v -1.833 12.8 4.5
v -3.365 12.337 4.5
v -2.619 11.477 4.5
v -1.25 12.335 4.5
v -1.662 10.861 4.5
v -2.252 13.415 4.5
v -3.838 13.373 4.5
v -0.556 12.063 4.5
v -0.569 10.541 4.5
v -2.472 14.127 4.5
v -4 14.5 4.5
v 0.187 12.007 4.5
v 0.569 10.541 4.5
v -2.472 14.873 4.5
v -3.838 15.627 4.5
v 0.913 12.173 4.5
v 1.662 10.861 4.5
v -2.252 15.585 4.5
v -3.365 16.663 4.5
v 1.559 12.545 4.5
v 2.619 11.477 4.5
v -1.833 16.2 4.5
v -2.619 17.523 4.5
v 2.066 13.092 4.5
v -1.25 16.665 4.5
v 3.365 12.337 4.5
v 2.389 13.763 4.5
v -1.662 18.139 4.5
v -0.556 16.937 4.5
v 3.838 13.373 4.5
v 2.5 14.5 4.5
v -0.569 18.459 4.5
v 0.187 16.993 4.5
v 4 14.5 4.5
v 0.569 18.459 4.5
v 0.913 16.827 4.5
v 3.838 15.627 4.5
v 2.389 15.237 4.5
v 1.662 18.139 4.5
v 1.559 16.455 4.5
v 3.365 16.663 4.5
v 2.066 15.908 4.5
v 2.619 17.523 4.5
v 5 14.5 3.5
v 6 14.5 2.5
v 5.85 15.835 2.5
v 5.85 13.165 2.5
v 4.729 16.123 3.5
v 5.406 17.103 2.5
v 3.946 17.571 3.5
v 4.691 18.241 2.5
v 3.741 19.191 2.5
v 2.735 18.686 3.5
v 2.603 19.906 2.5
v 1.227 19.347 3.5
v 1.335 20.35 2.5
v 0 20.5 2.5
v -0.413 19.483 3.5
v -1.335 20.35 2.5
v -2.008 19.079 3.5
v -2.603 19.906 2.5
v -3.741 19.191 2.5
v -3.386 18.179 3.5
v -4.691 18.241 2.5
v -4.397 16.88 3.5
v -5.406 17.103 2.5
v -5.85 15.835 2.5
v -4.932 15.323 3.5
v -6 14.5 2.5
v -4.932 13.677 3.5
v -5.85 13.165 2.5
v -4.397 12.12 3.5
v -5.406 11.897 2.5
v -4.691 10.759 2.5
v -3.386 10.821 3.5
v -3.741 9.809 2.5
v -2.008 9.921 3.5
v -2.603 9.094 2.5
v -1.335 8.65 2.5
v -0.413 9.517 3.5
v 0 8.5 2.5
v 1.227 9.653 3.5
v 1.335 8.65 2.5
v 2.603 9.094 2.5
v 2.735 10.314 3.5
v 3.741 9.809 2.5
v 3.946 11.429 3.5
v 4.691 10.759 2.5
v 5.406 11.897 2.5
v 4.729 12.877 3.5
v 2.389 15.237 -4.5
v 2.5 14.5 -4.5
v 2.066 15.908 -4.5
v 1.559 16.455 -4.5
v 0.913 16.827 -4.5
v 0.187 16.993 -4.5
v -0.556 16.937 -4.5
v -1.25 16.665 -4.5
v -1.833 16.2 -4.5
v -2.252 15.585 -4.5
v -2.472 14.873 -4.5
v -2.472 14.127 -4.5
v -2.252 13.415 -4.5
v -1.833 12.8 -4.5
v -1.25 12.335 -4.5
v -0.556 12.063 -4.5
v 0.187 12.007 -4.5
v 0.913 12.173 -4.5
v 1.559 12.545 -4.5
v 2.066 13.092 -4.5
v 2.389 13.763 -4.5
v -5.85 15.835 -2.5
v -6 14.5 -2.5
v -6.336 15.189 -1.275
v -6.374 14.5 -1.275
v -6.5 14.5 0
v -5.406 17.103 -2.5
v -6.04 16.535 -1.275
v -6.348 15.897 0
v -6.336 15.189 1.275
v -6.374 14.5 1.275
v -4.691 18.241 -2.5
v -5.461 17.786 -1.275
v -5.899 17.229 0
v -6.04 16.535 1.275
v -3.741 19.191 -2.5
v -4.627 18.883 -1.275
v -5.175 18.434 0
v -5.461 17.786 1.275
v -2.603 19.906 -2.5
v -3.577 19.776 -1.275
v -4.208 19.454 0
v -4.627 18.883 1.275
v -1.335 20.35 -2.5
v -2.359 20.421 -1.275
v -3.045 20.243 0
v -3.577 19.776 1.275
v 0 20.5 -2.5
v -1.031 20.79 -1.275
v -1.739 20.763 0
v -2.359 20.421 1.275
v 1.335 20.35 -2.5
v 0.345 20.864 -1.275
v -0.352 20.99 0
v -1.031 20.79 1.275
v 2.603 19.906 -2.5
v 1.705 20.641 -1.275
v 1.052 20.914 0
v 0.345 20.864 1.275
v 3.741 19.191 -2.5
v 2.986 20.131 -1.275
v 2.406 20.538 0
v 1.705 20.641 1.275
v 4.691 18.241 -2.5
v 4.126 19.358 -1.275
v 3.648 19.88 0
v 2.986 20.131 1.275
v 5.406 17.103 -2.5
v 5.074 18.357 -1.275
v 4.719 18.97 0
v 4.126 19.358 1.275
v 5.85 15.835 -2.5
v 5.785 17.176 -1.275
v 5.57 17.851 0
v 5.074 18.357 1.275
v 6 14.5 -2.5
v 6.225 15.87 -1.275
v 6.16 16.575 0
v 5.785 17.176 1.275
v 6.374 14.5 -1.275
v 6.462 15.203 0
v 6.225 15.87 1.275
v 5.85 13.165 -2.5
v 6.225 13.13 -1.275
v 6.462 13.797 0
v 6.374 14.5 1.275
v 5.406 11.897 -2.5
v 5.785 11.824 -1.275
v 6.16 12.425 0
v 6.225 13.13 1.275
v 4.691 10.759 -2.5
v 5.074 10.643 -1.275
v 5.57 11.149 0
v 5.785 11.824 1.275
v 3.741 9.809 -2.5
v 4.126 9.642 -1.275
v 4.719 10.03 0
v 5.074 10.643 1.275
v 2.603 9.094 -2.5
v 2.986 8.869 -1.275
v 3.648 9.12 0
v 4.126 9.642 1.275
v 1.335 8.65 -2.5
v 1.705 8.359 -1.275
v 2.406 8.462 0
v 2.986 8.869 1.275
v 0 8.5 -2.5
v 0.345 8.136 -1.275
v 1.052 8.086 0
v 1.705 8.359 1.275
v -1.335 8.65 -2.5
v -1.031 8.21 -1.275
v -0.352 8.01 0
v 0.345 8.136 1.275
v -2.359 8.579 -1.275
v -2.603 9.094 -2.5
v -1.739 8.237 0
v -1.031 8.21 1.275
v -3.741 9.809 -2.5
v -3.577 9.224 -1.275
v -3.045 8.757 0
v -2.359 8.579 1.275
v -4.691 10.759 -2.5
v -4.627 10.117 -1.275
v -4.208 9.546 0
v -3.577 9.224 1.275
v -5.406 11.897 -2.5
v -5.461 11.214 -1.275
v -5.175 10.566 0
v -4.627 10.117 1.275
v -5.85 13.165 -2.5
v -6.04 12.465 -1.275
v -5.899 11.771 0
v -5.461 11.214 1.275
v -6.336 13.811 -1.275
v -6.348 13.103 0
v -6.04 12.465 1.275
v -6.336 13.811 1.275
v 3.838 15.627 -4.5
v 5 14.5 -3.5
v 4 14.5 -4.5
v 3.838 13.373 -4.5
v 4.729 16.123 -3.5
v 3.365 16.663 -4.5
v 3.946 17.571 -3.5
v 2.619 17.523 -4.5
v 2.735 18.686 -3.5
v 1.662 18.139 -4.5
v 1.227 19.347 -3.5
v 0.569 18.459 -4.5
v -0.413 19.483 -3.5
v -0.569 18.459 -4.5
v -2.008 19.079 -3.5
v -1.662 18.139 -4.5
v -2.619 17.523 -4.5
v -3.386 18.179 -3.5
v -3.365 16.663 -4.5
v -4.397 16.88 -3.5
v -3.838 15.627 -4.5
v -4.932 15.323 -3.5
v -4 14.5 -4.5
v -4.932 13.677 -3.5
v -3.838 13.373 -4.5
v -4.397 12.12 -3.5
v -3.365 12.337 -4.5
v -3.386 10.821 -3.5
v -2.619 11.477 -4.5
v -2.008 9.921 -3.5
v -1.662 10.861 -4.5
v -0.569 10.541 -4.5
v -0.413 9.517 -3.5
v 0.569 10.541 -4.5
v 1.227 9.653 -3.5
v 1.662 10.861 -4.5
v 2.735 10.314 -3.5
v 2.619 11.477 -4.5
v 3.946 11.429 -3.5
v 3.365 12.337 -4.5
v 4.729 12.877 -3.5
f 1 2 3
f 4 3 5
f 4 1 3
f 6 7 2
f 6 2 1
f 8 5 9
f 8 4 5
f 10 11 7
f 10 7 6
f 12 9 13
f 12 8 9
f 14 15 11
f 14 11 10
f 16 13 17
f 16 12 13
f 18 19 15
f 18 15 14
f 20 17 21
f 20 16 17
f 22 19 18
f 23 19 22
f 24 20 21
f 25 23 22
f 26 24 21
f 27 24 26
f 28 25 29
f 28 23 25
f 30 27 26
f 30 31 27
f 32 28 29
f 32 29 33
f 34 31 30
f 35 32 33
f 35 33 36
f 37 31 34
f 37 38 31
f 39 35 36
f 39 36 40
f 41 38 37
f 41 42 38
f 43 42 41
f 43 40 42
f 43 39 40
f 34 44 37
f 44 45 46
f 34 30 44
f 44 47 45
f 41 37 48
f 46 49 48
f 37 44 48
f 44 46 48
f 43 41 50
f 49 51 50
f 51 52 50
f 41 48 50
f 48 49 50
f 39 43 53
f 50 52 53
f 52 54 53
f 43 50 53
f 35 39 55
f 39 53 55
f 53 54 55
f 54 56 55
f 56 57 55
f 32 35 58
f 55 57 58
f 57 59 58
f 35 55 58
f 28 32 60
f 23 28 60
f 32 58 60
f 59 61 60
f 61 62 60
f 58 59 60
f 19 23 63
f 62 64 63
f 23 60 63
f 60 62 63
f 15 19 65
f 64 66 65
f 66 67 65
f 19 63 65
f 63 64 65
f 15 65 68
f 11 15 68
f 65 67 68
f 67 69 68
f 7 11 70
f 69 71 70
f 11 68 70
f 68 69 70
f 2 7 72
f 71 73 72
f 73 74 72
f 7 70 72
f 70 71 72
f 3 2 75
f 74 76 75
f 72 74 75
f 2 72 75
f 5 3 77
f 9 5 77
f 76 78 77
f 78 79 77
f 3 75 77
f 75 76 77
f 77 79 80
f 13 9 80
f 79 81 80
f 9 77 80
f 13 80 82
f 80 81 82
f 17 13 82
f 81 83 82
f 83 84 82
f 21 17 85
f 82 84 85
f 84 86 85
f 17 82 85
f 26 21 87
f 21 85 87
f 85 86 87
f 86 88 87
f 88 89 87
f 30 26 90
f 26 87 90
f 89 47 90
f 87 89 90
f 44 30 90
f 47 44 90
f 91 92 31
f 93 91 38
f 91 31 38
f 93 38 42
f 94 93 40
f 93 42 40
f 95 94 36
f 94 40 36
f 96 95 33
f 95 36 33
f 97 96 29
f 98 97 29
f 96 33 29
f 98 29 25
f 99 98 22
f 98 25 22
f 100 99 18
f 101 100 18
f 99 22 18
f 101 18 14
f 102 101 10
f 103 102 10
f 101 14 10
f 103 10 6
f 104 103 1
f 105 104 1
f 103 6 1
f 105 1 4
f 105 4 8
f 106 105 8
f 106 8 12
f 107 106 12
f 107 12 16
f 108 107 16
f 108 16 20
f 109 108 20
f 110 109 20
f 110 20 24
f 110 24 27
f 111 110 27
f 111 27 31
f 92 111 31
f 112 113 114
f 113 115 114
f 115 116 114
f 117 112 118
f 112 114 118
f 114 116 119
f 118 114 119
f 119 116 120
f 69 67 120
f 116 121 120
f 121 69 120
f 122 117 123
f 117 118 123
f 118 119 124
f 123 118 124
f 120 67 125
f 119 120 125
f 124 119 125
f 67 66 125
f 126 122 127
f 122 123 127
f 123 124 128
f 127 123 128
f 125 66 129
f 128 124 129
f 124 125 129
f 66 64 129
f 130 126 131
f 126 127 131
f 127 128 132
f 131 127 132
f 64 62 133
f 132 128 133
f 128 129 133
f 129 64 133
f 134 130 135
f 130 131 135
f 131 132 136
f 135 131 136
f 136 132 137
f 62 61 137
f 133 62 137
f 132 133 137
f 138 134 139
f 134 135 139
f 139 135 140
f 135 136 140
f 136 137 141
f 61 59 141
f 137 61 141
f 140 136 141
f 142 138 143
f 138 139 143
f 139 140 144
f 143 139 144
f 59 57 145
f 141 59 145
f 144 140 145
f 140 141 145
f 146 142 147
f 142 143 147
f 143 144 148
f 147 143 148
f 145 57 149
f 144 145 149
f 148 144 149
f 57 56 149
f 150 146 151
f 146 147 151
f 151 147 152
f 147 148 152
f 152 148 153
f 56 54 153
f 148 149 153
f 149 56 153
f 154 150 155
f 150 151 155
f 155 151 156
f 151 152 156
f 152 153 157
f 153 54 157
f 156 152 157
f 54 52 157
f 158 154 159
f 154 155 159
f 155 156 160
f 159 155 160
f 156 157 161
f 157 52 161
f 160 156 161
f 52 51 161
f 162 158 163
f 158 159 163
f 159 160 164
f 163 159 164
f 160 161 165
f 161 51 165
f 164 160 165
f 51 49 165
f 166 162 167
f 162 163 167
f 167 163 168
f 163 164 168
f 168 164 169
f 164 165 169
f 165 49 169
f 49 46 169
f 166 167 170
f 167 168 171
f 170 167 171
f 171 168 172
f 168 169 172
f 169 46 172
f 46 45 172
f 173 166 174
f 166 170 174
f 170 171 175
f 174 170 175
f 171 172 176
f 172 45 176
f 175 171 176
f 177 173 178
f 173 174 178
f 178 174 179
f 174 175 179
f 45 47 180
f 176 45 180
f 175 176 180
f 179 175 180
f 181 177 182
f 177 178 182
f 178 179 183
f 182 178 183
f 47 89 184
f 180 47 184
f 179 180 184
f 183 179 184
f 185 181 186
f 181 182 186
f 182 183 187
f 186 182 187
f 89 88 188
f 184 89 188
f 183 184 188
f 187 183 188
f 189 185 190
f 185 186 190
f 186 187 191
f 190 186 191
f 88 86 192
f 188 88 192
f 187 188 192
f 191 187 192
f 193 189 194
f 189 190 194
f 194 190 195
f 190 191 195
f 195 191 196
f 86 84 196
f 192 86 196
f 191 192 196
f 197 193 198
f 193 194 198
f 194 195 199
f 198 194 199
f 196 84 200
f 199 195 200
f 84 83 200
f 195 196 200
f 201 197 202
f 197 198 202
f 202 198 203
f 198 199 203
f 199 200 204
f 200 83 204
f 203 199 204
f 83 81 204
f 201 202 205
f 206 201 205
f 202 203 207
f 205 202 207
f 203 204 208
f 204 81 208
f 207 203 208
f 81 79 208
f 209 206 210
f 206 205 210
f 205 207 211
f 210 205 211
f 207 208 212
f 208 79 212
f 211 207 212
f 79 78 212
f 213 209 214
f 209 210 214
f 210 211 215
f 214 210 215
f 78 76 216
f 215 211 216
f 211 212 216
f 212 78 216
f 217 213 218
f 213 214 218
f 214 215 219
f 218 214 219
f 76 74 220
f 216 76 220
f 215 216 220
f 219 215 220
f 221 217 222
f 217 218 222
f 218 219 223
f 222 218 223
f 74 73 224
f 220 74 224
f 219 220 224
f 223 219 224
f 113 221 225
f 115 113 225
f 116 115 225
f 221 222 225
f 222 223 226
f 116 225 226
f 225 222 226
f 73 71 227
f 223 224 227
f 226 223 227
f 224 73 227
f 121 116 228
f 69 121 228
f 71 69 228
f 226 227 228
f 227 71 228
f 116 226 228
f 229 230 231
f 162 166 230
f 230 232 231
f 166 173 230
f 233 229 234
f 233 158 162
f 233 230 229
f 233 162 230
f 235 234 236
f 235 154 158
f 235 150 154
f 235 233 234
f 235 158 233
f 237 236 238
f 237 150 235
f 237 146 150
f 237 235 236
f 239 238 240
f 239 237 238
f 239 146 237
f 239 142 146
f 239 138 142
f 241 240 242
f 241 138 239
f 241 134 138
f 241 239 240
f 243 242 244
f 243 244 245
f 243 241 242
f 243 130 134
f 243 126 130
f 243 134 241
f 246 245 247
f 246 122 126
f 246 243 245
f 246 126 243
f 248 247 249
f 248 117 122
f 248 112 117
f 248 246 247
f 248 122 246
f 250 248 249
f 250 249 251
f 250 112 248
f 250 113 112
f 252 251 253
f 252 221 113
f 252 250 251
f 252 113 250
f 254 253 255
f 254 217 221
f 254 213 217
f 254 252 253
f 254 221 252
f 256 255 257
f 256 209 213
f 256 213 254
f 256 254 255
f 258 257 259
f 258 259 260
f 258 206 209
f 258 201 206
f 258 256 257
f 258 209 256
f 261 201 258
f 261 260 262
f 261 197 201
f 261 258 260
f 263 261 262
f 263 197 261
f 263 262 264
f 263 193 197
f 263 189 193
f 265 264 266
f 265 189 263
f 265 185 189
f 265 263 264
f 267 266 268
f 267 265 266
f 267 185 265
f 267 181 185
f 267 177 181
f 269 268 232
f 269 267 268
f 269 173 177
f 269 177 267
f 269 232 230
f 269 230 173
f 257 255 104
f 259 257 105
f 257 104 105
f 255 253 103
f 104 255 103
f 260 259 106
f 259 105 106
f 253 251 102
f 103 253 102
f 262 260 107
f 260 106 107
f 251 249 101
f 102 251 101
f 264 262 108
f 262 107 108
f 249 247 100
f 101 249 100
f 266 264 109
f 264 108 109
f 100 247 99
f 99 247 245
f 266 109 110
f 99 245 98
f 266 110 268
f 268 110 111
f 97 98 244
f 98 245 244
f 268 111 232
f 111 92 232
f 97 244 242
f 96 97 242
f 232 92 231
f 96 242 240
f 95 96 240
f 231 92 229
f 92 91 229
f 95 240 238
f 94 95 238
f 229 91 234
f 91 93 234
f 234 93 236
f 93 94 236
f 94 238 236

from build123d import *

# Parameters (mm, degrees)
SKETCH_1_R          = 10
EXTRUDE_1_DEPTH     = 4.5
SKETCH_4_R          = 8
EXTRUDE_3_DEPTH     = 5
SKETCH_5_R          = 8
EXTRUDE_4_DEPTH     = 2.5
SKETCH_8_R          = 4
SKETCH_7_R          = 6
SKETCH_9_R          = 14.627232323
SKETCH_9_R_2        = 10
CUT_EXTRUDE_1_DEPTH = 18
SKETCH_10_R         = 2.5
CUT_EXTRUDE_2_DEPTH = 10
SKETCH_2_R          = 6
EXTRUDE_5_DEPTH     = 80
SKETCH_11_W         = 44.642823809
SKETCH_11_H         = 125.571137761
SKETCH_11_R         = 6
CUT_EXTRUDE_3_DEPTH = 18


with BuildPart() as part:
    # 草图1 → 凸台-拉伸1 (new body)
    with BuildSketch(Plane(origin=(0, 0, 0), x_dir=(1, 0, 0), z_dir=(0, 1, 0))):
        with Locations(Location((0, 0, 0), (0, 0, 270))):
            Circle(SKETCH_1_R)
    extrude(amount=EXTRUDE_1_DEPTH)

    # 草图4 → 凸台-拉伸3 (add, symmetric)
    with BuildSketch(Plane.XY):
        with BuildLine():
            Line((-10, 4.5), (10, 4.5))
            Line((10, 4.5), (10, 14.5))
            ThreePointArc((10, 14.5), (0, 24.5), (-10, 14.5))
            Line((-10, 14.5), (-10, 4.5))
        make_face()
        with Locations((0, 14.5)):
            Circle(SKETCH_4_R, mode=Mode.SUBTRACT)
    extrude(amount=EXTRUDE_3_DEPTH, both=True)

    # 草图5 → 凸台-拉伸4 (add, symmetric)
    with BuildSketch(Plane.XY):
        with Locations((0, 14.5)):
            Circle(SKETCH_5_R)
    extrude(amount=EXTRUDE_4_DEPTH, both=True)

    # 草图8 → 放样1 section 0
    with BuildSketch(Plane.XY.offset(4.5)):
        with Locations((0, 14.5)):
            Circle(SKETCH_8_R)
    # 草图7 → 放样1 section 1
    with BuildSketch(Plane.XY.offset(2.5)):
        with Locations((0, 14.5)):
            Circle(SKETCH_7_R)
    loft_1 = loft()

    # 镜向1: 放样1 across plane
    add(loft_1.mirror(Plane.XY))

    # 草图9 → 切除-拉伸1 (cut)
    with BuildSketch(Plane(origin=(0, 4.5, 0), x_dir=(1, 0, 0), z_dir=(0, 1, 0))):
        Circle(SKETCH_9_R)
        with Locations(Location((0, 0, 0), (0, 0, 150))):
            Circle(SKETCH_9_R_2, mode=Mode.SUBTRACT)
    extrude(amount=CUT_EXTRUDE_1_DEPTH, mode=Mode.SUBTRACT)

    # 草图10 → 切除-拉伸2 (cut)
    with BuildSketch(Plane.XY.offset(4.5)):
        with Locations((0, 14.5)):
            Circle(SKETCH_10_R)
    extrude(amount=-CUT_EXTRUDE_2_DEPTH, mode=Mode.SUBTRACT)

    # 草图2 → 凸台-拉伸5 (add)
    with BuildSketch(Plane.XZ):
        with Locations(Location((0, 0, 0), (0, 0, 270))):
            Circle(SKETCH_2_R)
    extrude(amount=EXTRUDE_5_DEPTH)

    # 草图11 → 切除-拉伸3 (cut, symmetric)
    with BuildSketch(Plane.XY.offset(4.5)):
        with Locations((1.10319776, -29.667351992)):
            Rectangle(SKETCH_11_W, SKETCH_11_H)
        with Locations(Location((0, 14.5, 0), (0, 0, 180))):
            Circle(SKETCH_11_R, mode=Mode.SUBTRACT)
    extrude(amount=CUT_EXTRUDE_3_DEPTH, both=True, mode=Mode.SUBTRACT)

    # 草图13 → 旋转2 (revolve)
    with BuildSketch(Plane(origin=(0, 0, 0), x_dir=(0, 0, -1), z_dir=(1, 0, 0)), mode=Mode.PRIVATE) as revolve_2_sk:
        with BuildLine():
            Line((-2.5, 20.5), (2.5, 20.5))
            ThreePointArc((2.5, 20.5), (0, 21), (-2.5, 20.5))
        make_face()
    revolve(revolve_2_sk.sketch.rotate(Axis((0, 14.5, 0), (0, 0, -1)), 270), axis=Axis((0, 14.5, 0), (0, 0, -1)))


solid = part.part
